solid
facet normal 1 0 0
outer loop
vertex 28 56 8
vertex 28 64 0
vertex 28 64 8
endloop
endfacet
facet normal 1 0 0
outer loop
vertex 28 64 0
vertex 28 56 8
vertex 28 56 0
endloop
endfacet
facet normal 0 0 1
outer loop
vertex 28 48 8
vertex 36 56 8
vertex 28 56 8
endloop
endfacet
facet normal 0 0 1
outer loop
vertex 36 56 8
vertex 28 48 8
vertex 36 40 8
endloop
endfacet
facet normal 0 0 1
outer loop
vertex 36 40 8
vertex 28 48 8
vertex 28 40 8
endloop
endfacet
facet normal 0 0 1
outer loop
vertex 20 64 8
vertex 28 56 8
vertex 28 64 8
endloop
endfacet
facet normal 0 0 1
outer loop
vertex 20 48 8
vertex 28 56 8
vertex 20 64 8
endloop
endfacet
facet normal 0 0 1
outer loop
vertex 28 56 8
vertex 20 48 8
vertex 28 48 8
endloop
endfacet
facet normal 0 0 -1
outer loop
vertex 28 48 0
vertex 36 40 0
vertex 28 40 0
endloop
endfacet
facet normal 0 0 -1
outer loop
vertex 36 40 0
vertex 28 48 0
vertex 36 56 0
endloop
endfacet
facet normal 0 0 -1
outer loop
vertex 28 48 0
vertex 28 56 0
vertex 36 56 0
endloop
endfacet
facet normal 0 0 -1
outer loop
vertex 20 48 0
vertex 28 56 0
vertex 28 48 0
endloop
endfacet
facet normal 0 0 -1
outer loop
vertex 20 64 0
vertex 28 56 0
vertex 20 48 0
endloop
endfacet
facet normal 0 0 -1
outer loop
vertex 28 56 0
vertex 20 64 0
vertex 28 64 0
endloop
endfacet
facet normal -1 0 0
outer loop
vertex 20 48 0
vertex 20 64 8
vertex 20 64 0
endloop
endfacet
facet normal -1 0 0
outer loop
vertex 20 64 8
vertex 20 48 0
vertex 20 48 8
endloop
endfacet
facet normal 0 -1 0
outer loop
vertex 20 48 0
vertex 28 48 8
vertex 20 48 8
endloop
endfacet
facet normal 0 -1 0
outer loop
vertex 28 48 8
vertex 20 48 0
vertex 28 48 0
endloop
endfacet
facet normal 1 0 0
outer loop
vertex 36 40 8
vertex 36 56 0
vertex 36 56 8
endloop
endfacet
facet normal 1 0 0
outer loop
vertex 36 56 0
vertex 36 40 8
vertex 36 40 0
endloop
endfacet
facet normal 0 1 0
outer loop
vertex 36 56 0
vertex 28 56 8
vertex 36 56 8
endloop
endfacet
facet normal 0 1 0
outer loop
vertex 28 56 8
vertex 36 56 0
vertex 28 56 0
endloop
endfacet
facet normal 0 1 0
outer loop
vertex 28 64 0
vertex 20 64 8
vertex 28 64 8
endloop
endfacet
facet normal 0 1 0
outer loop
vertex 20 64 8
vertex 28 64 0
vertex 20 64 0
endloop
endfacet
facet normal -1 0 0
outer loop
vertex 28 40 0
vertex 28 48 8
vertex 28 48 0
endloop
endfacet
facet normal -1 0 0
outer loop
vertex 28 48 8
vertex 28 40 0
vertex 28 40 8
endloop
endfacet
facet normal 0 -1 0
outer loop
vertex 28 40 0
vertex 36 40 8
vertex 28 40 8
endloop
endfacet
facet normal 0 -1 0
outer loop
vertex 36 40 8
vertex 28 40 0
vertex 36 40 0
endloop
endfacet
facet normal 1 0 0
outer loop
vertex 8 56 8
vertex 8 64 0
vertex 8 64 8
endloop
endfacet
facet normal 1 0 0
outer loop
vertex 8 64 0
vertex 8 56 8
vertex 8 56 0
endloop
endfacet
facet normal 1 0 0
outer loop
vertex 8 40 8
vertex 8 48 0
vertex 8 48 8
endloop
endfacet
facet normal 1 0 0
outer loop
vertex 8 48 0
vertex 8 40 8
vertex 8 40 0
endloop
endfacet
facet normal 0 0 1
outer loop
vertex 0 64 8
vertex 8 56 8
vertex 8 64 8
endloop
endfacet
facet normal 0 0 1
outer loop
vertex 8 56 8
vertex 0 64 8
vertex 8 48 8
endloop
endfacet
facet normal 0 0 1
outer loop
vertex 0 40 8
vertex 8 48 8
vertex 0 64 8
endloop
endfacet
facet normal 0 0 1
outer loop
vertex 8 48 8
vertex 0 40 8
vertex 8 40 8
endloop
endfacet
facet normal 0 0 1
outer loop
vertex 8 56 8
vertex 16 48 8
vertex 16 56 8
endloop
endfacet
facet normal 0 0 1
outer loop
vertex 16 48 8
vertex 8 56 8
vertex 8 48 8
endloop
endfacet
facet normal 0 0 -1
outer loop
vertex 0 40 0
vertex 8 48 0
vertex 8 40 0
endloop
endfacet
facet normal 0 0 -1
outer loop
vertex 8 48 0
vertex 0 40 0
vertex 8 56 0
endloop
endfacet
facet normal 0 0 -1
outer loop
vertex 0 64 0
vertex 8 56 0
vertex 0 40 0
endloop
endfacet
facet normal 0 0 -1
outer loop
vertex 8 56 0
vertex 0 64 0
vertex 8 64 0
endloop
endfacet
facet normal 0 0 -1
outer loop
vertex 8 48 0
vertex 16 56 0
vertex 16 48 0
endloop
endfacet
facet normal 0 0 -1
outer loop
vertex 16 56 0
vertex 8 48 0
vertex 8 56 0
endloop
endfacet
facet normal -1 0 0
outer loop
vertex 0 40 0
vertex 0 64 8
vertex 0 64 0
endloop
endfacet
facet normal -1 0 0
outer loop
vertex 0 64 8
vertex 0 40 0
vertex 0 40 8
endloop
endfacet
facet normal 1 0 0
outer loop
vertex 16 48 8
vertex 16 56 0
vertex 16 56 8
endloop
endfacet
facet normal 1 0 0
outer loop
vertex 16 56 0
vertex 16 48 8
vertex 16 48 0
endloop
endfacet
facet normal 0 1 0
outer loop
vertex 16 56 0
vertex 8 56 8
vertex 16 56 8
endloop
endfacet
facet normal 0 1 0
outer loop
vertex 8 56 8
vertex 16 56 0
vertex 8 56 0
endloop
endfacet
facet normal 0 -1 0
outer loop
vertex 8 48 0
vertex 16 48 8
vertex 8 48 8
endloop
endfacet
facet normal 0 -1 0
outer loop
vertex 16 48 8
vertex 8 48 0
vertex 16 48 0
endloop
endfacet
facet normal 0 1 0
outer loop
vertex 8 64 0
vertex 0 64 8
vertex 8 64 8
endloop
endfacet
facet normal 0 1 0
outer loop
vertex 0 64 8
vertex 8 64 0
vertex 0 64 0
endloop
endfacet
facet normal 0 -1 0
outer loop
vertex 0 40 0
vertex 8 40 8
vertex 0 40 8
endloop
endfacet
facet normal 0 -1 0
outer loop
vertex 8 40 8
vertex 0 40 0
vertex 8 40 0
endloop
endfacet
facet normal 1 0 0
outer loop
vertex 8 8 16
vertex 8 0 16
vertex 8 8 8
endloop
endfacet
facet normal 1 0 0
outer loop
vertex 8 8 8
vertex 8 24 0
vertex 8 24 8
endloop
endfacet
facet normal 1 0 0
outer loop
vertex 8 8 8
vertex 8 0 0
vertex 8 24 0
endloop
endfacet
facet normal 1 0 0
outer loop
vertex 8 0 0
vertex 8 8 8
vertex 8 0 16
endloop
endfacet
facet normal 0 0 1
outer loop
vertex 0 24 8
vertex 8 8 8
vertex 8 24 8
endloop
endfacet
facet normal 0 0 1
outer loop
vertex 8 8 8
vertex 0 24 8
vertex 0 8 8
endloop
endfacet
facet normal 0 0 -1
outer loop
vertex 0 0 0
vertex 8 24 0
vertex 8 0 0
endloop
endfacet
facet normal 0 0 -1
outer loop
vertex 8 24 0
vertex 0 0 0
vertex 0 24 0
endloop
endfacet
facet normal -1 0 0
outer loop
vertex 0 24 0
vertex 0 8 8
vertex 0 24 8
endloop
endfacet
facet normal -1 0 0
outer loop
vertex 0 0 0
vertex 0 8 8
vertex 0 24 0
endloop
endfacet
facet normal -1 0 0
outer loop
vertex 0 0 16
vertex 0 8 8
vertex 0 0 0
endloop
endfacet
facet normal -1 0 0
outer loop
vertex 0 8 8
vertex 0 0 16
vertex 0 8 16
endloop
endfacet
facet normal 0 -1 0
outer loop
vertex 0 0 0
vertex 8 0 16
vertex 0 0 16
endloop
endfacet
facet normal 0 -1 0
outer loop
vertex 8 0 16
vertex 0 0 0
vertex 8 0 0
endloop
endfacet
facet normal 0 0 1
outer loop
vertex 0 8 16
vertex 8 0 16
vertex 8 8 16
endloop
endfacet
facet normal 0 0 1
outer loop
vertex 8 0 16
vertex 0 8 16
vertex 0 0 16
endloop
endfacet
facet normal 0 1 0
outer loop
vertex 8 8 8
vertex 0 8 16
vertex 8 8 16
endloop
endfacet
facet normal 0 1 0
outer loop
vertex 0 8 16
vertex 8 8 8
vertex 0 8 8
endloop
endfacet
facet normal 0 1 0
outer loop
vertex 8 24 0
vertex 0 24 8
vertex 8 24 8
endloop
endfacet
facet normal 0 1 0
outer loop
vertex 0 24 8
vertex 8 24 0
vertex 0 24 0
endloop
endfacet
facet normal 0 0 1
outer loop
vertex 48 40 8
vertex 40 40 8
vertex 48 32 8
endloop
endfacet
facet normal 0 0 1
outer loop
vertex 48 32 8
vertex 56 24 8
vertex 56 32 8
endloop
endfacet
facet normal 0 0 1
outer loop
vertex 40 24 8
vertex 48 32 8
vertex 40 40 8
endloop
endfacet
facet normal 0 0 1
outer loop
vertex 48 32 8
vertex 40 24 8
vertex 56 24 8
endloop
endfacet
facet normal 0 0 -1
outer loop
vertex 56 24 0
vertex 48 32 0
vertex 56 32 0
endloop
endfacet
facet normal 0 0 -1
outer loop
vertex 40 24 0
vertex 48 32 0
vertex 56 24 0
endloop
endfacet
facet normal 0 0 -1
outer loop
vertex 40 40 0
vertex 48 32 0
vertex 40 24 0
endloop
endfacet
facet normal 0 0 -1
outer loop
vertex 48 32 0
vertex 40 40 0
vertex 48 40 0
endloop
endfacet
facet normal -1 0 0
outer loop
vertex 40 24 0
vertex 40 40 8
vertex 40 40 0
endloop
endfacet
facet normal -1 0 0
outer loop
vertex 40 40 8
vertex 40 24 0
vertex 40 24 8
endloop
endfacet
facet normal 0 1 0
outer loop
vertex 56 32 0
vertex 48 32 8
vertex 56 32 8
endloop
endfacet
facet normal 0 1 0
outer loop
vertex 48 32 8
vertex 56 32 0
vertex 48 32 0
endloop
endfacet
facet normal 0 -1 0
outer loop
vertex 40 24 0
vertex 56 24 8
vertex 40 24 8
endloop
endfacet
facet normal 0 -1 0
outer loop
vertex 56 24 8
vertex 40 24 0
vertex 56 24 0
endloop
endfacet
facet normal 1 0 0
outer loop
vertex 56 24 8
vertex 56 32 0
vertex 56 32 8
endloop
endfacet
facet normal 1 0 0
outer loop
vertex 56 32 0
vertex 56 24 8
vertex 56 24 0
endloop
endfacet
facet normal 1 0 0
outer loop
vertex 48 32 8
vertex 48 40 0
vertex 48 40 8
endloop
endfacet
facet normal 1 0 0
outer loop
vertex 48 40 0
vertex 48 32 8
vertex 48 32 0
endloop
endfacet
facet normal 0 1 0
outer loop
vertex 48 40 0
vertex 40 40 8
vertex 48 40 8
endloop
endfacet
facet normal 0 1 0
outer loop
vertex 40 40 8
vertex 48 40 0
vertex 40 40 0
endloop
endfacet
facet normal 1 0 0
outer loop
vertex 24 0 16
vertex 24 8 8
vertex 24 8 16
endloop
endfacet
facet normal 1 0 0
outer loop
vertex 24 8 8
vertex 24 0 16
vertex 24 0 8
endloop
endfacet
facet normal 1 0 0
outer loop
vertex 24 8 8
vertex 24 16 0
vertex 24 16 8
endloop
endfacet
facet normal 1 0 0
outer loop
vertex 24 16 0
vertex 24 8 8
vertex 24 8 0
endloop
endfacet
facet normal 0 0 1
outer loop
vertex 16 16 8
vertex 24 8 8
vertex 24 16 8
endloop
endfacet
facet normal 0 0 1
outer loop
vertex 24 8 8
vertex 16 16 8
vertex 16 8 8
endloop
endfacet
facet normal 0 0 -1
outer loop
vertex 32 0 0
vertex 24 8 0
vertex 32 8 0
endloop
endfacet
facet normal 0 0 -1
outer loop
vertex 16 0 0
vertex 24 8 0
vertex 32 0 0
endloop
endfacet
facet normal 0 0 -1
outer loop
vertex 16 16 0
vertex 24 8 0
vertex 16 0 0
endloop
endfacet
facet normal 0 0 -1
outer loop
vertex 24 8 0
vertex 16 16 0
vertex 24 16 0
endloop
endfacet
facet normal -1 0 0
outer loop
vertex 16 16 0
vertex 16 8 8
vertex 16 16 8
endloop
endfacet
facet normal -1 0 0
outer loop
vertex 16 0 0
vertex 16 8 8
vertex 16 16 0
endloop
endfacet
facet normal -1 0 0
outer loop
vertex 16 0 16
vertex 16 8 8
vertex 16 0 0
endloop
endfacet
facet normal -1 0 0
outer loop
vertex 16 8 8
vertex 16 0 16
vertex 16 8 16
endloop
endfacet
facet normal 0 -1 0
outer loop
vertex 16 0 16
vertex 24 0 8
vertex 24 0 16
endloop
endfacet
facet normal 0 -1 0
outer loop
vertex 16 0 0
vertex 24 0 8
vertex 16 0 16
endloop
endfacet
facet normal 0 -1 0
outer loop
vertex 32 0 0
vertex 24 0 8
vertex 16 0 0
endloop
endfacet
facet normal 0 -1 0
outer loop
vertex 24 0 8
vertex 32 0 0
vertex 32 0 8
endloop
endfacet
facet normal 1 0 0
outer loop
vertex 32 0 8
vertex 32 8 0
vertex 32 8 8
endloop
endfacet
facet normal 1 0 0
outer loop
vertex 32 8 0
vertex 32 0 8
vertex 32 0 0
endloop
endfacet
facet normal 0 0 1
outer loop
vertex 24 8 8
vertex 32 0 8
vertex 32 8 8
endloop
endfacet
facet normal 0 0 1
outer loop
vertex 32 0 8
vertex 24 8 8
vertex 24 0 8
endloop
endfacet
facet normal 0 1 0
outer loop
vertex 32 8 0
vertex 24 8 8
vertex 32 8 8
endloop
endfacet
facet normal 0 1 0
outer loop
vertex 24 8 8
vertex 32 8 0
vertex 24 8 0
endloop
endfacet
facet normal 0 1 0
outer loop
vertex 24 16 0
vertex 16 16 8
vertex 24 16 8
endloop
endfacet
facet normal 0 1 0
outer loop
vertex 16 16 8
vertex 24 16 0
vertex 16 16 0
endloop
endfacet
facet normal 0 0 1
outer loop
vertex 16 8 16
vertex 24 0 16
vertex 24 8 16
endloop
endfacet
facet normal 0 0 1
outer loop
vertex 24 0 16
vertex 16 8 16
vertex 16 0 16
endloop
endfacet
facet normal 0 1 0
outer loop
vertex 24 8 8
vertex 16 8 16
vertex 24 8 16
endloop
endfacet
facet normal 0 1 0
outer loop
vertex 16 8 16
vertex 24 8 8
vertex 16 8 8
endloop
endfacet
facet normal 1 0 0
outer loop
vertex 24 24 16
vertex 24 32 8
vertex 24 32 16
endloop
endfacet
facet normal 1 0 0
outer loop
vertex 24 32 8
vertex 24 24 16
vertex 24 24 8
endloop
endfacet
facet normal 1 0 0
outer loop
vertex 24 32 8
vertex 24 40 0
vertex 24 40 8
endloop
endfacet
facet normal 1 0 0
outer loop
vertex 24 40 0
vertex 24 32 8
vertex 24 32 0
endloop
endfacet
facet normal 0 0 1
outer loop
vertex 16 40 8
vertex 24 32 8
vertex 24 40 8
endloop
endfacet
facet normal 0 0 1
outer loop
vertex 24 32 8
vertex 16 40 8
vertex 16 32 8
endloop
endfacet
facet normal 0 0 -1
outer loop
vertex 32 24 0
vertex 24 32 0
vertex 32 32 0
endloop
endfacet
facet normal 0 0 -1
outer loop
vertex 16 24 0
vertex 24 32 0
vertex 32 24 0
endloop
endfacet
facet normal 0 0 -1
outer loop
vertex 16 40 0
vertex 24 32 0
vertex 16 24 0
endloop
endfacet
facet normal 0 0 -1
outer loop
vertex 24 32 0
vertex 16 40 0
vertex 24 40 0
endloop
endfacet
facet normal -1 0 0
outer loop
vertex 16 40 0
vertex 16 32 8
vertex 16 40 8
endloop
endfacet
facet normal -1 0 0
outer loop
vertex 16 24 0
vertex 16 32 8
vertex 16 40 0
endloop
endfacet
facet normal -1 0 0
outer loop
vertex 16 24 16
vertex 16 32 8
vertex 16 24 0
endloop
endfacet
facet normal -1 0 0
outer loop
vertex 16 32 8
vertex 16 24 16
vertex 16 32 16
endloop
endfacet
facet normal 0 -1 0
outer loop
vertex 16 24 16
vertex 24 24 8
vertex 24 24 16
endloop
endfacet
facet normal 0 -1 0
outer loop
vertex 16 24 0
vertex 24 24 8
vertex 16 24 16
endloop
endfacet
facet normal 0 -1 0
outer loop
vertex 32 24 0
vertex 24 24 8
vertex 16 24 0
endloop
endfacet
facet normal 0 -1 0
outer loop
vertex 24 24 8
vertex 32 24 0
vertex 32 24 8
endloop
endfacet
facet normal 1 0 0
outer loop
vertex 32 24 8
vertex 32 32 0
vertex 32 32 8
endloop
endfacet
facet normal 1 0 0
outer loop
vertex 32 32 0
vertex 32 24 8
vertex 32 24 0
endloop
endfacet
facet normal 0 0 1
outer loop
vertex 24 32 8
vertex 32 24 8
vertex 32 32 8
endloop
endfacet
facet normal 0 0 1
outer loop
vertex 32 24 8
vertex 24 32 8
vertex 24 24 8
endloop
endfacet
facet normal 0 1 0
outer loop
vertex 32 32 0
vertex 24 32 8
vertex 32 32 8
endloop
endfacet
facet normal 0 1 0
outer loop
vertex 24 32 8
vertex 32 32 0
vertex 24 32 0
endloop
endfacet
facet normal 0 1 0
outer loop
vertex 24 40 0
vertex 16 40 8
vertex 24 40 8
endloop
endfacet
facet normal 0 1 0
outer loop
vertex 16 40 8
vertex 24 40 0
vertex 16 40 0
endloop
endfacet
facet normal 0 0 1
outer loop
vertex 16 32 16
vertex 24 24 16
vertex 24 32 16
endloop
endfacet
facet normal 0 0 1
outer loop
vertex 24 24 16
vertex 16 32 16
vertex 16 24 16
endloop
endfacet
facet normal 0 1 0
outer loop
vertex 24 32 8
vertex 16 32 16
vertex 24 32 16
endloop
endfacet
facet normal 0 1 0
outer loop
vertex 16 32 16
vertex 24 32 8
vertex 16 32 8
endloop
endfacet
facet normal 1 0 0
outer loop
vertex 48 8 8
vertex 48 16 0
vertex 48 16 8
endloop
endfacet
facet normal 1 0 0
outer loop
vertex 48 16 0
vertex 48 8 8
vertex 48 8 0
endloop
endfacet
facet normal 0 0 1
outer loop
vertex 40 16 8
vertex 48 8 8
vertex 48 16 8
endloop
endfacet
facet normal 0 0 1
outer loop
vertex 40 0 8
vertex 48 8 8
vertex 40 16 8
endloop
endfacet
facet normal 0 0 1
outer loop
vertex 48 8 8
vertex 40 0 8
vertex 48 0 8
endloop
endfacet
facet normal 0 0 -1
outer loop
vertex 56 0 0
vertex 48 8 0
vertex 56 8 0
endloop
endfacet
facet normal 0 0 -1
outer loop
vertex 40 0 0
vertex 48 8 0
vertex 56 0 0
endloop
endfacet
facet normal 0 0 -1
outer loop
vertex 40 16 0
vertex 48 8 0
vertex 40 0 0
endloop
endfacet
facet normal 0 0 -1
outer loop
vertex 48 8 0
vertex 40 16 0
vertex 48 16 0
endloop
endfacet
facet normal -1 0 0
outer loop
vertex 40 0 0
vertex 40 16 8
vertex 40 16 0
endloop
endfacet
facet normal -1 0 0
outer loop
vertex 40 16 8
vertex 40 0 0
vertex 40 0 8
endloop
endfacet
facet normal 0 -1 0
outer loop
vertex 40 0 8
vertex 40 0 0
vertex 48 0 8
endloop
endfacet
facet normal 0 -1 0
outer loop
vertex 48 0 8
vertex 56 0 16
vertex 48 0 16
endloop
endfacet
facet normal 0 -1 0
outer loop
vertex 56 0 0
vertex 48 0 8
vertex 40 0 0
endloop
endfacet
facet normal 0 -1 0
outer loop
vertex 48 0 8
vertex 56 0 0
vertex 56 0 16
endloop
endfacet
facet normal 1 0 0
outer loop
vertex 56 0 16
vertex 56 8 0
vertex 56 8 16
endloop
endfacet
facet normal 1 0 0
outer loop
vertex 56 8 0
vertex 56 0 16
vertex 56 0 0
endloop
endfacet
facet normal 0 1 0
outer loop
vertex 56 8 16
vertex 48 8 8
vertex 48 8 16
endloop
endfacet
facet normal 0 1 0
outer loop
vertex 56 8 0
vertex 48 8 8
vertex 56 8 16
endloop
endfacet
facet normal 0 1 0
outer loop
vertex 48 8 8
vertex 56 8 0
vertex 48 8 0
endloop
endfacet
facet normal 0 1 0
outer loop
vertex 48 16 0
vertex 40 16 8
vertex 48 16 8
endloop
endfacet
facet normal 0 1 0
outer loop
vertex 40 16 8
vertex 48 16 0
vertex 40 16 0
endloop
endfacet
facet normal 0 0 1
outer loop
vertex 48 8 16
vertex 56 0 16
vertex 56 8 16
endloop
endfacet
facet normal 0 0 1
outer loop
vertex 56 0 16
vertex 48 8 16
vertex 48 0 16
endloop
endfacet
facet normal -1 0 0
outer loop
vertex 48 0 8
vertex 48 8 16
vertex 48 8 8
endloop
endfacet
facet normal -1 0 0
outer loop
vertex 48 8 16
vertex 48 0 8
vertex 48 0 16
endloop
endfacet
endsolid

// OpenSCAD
// 
//     |_
//     /
//
module tri() {
    union() {
        cube(1);
        translate([1, 0, 0])
            cube(1);
        translate([0, 1, 0])
            cube(1);
        translate([0, 0, 1])
            cube(1);
    }
}

// 
//      _
//    |/
//
module snake() {
    union() {
        cube(1);
        translate([1, 0, 0])
            cube(1);
        translate([0, 1, 0])
            cube(1);
        translate([1, 0, 1])
            cube(1);
    }
}

// 
//    |_
//
module L() {
    union() {
        cube(1);
        translate([1, 0, 0])
            cube(1);
        translate([0, 1, 0])
            cube(1);
    }
}

//    |
//    |_
//
module BigL() {
    union() {
        cube(1);
        translate([0, 0, 1])
            cube(1);
        translate([0, 1, 0])
            cube(1);
        translate([0, 2, 0])
            cube(1);
    }
}

//     _|
//    |
//
module Flesh() {
    union() {
        cube(1);
        translate([1, 0, 0])
            cube(1);
        translate([0, 1, 0])
            cube(1);
        translate([1, -1, 0])
            cube(1);
    }
}

//   _ _
//    |
//
module T() {
    union() {
        cube(1);
        translate([1, 0, 0])
            cube(1);
        translate([0, 1, 0])
            cube(1);
        translate([0, -1, 0])
            cube(1);
    }
}


module magic_cube() {
    translate([2.5, 6, 0])
        Flesh();
    translate([0, 6, 0])
        T();

    BigL();

    translate([5, 3, 0])
        L();

    translate([2, 0, 0])
        tri();
    translate([2, 3, 0])
        tri();
    translate([5, 0, 0])
        snake();
}

scale(8)
    magic_cube();
